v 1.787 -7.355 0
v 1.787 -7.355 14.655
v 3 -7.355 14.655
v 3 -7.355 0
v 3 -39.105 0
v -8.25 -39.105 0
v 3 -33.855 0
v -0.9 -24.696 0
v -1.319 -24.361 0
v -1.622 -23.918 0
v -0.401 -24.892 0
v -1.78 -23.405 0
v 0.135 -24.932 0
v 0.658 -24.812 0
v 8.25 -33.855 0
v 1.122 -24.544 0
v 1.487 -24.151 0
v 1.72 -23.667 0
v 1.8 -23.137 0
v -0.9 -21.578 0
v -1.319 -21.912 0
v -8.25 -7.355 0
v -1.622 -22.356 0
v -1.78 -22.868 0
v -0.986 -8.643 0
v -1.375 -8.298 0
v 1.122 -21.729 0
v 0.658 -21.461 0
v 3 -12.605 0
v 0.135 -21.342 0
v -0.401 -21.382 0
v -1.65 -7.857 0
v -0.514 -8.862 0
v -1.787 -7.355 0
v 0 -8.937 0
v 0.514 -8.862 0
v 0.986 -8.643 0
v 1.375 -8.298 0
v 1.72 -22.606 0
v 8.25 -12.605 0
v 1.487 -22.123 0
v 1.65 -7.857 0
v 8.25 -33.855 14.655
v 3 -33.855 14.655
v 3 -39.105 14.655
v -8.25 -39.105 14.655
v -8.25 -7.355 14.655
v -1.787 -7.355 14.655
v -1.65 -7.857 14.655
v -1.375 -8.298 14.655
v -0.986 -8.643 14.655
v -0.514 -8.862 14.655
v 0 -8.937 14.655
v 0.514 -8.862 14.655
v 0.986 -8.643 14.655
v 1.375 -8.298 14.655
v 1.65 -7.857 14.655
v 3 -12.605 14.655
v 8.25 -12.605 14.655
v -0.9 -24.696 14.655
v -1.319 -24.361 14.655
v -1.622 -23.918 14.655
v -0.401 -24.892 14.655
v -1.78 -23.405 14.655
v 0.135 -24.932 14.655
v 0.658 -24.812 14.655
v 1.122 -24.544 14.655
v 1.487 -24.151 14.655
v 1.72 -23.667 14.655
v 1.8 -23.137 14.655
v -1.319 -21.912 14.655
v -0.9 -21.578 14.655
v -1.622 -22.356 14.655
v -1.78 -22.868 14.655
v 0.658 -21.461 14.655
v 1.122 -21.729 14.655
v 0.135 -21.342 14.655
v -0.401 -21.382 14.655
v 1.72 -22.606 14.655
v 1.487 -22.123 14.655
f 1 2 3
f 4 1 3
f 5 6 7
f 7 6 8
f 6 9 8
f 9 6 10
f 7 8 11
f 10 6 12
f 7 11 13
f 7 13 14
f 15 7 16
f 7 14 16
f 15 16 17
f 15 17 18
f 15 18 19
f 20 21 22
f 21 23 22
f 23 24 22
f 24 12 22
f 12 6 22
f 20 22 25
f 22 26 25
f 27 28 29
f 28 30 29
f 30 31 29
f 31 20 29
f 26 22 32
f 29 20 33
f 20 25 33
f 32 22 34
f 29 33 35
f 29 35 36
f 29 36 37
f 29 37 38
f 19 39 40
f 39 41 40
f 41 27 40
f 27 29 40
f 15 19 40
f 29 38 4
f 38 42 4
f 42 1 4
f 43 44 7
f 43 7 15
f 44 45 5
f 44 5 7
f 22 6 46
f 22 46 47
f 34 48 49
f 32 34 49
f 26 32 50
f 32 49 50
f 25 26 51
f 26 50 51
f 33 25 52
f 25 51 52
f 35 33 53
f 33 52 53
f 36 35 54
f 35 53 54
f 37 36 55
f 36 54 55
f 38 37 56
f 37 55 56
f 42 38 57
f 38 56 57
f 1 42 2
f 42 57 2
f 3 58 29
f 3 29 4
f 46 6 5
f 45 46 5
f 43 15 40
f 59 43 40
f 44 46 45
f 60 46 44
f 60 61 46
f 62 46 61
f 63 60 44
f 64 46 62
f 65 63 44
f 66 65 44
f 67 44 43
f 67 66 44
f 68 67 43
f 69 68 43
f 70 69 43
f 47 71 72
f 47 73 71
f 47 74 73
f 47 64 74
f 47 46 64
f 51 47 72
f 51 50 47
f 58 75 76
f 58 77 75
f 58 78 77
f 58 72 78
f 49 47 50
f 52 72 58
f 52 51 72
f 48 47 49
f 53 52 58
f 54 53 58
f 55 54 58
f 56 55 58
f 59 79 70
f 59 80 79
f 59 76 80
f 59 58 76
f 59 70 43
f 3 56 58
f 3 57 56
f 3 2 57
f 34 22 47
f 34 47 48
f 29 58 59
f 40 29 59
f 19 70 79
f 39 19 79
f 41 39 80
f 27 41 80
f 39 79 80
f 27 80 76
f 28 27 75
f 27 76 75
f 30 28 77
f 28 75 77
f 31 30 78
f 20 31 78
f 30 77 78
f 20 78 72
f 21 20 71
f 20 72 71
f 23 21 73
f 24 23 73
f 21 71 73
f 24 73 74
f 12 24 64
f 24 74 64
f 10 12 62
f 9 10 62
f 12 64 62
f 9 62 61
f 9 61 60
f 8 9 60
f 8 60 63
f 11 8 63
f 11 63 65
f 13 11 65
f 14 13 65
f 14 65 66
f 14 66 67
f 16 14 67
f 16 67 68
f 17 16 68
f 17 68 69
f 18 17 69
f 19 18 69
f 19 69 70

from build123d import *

# Parameters (mm, degrees)
SKETCH2_W           = 16.5
SKETCH2_H           = 31.75
BOSS_EXTRUDE1_DEPTH = 14.655
SKETCH5_W           = 5.25
SKETCH5_H           = 5.25
CUT_EXTRUDE2_DEPTH  = 15.655
SKETCH6_R           = 1.8
CUT_EXTRUDE3_DEPTH  = 15.655


with BuildPart() as part:
    # Sketch2 → Boss-Extrude1 (new body)
    with BuildSketch(Plane.XY):
        with Locations((0, -23.230249591)):
            Rectangle(SKETCH2_W, SKETCH2_H)
    extrude(amount=BOSS_EXTRUDE1_DEPTH)

    # Sketch5 → Cut-Extrude2 (cut, through all)
    with BuildSketch(Plane.XY.offset(14.655)):
        with Locations((5.625, -36.480249591)):
            Rectangle(SKETCH5_W, SKETCH5_H)
        with Locations((5.625, -9.980249591)):
            Rectangle(SKETCH5_W, SKETCH5_H)
    extrude(amount=-CUT_EXTRUDE2_DEPTH, mode=Mode.SUBTRACT)

    # Sketch6 → Cut-Extrude3 (cut, through all)
    with BuildSketch(Plane.XY.offset(14.655)):
        with Locations((0, -23.136715776)):
            Circle(SKETCH6_R)
        with Locations((0, -7.136715776)):
            Circle(SKETCH6_R)
    extrude(amount=-CUT_EXTRUDE3_DEPTH, mode=Mode.SUBTRACT)


solid = part.part
